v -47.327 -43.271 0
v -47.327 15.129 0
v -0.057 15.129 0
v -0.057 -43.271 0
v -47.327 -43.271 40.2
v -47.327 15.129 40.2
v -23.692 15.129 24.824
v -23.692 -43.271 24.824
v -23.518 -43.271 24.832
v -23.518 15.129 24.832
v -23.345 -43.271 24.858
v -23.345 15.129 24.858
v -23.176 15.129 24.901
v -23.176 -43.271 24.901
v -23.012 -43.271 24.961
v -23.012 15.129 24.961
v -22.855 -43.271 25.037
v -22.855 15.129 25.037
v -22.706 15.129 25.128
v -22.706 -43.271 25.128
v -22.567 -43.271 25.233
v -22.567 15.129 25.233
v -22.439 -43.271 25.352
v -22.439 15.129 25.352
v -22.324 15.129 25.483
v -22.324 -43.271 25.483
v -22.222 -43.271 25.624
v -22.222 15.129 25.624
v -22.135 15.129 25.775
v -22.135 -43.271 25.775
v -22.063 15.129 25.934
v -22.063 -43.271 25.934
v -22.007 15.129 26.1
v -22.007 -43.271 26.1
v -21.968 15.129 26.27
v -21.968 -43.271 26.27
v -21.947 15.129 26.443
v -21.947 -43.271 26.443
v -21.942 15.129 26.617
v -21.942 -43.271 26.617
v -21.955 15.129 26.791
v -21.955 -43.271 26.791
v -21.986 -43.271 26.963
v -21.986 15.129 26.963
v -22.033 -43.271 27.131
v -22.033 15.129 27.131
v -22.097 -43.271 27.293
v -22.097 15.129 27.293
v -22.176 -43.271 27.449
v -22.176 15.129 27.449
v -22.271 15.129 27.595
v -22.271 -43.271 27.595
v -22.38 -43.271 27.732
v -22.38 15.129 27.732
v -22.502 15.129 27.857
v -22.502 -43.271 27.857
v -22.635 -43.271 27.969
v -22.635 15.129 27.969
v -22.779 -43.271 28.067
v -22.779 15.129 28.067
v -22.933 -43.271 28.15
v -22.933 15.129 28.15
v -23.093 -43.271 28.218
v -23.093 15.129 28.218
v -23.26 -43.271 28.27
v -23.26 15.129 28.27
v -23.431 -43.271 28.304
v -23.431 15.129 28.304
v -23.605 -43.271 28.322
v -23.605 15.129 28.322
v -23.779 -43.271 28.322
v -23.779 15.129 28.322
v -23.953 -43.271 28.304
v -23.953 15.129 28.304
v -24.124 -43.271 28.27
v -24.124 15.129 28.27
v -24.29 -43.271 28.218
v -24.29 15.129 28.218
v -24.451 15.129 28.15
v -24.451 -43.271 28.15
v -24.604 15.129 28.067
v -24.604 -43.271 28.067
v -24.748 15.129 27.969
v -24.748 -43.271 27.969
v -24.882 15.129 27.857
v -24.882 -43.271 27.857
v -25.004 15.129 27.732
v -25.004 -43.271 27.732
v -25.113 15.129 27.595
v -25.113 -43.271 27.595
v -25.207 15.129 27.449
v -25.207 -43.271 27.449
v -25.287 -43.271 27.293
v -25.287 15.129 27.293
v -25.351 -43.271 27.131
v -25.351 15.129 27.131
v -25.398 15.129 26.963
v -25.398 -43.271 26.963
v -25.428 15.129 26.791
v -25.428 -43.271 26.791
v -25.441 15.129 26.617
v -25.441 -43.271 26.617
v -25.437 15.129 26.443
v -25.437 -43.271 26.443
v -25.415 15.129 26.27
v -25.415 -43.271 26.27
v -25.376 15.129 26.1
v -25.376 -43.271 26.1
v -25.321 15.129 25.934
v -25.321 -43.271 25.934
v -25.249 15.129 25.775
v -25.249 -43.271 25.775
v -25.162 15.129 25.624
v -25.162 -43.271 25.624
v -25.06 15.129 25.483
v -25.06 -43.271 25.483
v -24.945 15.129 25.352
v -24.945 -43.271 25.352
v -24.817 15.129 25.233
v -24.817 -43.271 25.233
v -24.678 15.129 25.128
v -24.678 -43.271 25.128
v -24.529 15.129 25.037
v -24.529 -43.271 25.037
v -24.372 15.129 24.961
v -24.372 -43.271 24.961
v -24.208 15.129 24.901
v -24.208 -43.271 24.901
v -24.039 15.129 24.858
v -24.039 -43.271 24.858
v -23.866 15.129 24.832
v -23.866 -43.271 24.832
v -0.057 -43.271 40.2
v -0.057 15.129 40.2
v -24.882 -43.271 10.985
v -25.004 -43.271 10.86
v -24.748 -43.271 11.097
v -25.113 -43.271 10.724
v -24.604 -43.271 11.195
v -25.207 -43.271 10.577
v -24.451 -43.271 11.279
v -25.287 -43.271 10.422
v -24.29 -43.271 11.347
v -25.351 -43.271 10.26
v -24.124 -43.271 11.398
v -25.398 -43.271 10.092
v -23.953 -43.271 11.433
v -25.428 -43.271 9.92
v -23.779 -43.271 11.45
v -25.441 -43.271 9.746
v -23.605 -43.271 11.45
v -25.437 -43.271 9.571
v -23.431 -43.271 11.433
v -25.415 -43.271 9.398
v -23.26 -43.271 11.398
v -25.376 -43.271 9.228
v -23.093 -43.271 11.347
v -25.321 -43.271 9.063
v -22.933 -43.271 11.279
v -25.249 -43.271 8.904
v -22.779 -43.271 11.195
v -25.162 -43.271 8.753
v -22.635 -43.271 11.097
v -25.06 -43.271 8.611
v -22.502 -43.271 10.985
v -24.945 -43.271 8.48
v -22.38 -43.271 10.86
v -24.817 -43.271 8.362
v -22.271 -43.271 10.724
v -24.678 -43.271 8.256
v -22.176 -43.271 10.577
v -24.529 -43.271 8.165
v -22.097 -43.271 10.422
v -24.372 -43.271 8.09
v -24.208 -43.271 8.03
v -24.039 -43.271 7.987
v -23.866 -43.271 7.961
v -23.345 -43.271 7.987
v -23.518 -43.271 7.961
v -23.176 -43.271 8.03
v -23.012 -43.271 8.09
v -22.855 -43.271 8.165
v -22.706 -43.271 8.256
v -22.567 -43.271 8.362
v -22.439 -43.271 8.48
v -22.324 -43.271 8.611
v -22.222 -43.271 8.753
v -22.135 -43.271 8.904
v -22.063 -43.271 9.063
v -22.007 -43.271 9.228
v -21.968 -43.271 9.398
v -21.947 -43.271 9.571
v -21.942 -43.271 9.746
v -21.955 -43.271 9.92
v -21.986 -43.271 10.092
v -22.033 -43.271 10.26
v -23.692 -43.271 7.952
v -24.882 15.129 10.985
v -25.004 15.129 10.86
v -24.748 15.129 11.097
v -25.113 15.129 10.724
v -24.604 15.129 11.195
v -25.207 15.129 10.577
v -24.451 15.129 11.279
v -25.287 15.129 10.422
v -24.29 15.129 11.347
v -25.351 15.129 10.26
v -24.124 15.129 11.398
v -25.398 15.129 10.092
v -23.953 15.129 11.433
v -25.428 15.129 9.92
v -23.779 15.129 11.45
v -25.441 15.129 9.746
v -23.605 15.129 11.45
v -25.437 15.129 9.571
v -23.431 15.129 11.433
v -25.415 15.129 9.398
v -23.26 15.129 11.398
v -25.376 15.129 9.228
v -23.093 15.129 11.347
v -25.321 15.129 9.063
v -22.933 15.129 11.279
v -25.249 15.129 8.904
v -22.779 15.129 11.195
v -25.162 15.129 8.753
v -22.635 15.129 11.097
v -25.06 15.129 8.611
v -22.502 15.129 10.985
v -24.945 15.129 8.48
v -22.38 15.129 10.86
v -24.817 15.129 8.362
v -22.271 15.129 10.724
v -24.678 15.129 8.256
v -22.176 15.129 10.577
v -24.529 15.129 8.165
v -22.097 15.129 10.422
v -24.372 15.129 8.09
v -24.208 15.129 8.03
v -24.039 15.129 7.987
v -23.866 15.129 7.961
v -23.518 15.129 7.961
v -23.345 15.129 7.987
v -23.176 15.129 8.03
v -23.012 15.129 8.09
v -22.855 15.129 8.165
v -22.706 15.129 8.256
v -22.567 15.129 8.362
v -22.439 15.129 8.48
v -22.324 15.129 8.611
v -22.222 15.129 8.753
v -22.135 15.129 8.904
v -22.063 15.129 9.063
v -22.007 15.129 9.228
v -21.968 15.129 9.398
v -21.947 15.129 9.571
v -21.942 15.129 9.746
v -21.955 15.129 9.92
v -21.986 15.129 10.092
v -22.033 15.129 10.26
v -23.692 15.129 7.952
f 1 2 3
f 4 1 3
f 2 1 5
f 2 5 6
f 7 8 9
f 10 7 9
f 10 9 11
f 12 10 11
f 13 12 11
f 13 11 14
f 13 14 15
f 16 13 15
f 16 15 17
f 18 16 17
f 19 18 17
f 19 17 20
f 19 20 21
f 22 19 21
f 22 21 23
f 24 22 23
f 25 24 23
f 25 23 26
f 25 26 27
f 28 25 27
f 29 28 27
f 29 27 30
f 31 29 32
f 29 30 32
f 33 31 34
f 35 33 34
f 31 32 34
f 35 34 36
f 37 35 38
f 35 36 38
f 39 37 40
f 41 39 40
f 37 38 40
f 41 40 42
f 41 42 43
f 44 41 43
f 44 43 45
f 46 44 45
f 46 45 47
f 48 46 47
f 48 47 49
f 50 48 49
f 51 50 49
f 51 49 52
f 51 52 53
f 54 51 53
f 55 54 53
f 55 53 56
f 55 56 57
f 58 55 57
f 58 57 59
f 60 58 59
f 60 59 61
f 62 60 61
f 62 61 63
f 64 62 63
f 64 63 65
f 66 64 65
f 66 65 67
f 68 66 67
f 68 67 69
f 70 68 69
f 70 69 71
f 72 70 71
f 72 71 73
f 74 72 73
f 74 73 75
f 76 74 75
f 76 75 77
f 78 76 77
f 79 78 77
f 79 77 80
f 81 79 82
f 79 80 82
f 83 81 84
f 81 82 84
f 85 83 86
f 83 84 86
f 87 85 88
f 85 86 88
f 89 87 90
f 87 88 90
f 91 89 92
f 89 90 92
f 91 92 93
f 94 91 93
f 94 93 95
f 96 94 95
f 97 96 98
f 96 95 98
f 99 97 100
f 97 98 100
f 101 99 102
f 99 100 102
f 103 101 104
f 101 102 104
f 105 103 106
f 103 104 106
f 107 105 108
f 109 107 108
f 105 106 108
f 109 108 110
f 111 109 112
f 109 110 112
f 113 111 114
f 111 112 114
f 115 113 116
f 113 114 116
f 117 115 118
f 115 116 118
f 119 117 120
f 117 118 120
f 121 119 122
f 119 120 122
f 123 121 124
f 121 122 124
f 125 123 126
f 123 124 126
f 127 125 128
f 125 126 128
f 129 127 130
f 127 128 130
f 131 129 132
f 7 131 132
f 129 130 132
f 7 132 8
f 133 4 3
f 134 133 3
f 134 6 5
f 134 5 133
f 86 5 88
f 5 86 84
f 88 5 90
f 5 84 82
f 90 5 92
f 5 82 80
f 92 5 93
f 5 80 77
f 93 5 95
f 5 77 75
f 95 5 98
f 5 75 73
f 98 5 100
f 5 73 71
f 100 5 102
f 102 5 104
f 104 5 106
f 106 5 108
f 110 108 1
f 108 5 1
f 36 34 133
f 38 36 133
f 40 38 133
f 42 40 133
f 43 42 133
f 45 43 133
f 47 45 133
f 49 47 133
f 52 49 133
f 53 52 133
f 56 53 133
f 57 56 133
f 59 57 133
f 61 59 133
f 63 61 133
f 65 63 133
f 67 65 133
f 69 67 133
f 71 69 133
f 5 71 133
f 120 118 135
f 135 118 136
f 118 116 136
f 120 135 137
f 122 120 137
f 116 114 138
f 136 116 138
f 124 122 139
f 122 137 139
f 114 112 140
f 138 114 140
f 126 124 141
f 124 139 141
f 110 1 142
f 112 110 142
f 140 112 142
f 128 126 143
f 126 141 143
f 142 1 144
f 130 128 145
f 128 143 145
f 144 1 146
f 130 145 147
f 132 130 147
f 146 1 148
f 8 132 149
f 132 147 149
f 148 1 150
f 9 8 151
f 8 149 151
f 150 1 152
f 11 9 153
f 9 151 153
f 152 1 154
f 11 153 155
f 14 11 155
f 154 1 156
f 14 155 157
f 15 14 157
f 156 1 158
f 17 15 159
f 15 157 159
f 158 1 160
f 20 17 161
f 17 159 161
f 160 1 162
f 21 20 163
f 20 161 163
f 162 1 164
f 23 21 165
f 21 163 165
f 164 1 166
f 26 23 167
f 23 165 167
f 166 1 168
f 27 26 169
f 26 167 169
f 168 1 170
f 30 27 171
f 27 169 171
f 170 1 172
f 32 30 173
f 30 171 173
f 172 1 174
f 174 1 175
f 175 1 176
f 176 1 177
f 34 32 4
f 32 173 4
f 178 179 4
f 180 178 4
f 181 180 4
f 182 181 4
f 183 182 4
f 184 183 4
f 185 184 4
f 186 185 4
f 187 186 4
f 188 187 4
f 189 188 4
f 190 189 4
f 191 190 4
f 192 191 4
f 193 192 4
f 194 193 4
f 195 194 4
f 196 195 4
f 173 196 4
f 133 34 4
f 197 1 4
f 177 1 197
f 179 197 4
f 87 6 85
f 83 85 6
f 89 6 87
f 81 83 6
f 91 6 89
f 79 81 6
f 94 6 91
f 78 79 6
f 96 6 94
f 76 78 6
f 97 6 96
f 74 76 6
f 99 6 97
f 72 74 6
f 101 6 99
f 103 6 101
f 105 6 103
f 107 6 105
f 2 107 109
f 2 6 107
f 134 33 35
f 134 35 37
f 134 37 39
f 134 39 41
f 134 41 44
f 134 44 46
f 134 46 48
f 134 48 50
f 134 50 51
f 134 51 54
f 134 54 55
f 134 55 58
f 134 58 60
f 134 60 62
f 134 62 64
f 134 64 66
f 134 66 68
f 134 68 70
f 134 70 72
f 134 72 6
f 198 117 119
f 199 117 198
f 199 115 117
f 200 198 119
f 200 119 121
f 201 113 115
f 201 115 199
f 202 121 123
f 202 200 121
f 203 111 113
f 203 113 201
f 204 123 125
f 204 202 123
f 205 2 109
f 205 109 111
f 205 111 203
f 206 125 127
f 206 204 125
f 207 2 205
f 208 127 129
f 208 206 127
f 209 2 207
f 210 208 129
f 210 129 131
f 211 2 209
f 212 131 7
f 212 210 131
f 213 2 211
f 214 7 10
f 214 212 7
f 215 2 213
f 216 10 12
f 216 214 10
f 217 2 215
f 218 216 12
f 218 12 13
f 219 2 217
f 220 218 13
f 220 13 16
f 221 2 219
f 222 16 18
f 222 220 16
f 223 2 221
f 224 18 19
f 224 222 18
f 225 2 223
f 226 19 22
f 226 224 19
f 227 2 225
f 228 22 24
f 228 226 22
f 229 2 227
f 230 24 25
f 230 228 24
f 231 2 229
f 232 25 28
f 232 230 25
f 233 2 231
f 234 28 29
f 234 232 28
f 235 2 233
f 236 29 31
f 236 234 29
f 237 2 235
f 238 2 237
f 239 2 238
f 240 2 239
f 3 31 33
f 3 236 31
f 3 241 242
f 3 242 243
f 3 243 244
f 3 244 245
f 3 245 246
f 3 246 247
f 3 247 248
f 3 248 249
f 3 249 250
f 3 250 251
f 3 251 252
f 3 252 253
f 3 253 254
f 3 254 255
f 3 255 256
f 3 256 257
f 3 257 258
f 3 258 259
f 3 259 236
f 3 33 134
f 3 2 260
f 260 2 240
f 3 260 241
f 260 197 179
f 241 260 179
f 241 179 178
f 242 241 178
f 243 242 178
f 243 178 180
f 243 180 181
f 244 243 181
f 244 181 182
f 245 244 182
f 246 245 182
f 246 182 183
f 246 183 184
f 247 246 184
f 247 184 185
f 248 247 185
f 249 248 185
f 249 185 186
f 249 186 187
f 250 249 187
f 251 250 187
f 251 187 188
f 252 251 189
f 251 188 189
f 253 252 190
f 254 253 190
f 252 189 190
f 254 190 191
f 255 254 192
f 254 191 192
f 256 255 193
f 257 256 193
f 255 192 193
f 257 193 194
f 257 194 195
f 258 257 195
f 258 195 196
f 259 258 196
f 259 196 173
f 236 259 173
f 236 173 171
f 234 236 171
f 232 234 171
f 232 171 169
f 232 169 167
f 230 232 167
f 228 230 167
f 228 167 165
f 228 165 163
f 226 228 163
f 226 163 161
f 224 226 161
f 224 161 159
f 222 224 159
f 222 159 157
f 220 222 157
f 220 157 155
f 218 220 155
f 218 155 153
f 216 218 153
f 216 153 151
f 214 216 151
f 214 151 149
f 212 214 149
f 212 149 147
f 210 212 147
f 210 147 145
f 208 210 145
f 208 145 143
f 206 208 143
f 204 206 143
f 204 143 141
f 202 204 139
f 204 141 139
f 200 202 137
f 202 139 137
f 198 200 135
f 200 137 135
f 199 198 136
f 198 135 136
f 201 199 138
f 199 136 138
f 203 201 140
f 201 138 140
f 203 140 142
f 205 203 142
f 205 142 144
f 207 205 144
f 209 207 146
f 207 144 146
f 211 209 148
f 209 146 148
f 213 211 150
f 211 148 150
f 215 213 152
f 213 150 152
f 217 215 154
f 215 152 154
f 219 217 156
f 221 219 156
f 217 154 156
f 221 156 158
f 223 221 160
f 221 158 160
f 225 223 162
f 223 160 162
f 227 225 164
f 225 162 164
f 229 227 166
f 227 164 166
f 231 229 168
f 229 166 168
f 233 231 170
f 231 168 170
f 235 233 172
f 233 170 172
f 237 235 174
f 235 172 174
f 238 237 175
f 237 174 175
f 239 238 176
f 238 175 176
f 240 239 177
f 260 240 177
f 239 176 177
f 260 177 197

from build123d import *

# Parameters (mm, degrees)
SKETCH1_W           = 47.27
SKETCH1_H           = 58.4
BOSS_EXTRUDE1_DEPTH = 40.2
SKETCH4_R           = 1.75
CUT_EXTRUDE2_DEPTH  = 60


with BuildPart() as part:
    # Sketch1 → Boss-Extrude1 (new body)
    with BuildSketch(Plane.XY):
        with Locations((-23.691836225, -14.070929403)):
            Rectangle(SKETCH1_W, SKETCH1_H)
    extrude(amount=BOSS_EXTRUDE1_DEPTH)

    # Sketch4 → Cut-Extrude2 (cut)
    with BuildSketch(Plane.XZ.offset(43.270929403)):
        with Locations(Location((-23.691836225, 9.702218518, 0), (0, 0, 270))):
            Circle(SKETCH4_R)
        with Locations(Location((-23.691836225, 26.573715394, 0), (0, 0, 270))):
            Circle(SKETCH4_R)
    extrude(amount=-CUT_EXTRUDE2_DEPTH, mode=Mode.SUBTRACT)


solid = part.part
